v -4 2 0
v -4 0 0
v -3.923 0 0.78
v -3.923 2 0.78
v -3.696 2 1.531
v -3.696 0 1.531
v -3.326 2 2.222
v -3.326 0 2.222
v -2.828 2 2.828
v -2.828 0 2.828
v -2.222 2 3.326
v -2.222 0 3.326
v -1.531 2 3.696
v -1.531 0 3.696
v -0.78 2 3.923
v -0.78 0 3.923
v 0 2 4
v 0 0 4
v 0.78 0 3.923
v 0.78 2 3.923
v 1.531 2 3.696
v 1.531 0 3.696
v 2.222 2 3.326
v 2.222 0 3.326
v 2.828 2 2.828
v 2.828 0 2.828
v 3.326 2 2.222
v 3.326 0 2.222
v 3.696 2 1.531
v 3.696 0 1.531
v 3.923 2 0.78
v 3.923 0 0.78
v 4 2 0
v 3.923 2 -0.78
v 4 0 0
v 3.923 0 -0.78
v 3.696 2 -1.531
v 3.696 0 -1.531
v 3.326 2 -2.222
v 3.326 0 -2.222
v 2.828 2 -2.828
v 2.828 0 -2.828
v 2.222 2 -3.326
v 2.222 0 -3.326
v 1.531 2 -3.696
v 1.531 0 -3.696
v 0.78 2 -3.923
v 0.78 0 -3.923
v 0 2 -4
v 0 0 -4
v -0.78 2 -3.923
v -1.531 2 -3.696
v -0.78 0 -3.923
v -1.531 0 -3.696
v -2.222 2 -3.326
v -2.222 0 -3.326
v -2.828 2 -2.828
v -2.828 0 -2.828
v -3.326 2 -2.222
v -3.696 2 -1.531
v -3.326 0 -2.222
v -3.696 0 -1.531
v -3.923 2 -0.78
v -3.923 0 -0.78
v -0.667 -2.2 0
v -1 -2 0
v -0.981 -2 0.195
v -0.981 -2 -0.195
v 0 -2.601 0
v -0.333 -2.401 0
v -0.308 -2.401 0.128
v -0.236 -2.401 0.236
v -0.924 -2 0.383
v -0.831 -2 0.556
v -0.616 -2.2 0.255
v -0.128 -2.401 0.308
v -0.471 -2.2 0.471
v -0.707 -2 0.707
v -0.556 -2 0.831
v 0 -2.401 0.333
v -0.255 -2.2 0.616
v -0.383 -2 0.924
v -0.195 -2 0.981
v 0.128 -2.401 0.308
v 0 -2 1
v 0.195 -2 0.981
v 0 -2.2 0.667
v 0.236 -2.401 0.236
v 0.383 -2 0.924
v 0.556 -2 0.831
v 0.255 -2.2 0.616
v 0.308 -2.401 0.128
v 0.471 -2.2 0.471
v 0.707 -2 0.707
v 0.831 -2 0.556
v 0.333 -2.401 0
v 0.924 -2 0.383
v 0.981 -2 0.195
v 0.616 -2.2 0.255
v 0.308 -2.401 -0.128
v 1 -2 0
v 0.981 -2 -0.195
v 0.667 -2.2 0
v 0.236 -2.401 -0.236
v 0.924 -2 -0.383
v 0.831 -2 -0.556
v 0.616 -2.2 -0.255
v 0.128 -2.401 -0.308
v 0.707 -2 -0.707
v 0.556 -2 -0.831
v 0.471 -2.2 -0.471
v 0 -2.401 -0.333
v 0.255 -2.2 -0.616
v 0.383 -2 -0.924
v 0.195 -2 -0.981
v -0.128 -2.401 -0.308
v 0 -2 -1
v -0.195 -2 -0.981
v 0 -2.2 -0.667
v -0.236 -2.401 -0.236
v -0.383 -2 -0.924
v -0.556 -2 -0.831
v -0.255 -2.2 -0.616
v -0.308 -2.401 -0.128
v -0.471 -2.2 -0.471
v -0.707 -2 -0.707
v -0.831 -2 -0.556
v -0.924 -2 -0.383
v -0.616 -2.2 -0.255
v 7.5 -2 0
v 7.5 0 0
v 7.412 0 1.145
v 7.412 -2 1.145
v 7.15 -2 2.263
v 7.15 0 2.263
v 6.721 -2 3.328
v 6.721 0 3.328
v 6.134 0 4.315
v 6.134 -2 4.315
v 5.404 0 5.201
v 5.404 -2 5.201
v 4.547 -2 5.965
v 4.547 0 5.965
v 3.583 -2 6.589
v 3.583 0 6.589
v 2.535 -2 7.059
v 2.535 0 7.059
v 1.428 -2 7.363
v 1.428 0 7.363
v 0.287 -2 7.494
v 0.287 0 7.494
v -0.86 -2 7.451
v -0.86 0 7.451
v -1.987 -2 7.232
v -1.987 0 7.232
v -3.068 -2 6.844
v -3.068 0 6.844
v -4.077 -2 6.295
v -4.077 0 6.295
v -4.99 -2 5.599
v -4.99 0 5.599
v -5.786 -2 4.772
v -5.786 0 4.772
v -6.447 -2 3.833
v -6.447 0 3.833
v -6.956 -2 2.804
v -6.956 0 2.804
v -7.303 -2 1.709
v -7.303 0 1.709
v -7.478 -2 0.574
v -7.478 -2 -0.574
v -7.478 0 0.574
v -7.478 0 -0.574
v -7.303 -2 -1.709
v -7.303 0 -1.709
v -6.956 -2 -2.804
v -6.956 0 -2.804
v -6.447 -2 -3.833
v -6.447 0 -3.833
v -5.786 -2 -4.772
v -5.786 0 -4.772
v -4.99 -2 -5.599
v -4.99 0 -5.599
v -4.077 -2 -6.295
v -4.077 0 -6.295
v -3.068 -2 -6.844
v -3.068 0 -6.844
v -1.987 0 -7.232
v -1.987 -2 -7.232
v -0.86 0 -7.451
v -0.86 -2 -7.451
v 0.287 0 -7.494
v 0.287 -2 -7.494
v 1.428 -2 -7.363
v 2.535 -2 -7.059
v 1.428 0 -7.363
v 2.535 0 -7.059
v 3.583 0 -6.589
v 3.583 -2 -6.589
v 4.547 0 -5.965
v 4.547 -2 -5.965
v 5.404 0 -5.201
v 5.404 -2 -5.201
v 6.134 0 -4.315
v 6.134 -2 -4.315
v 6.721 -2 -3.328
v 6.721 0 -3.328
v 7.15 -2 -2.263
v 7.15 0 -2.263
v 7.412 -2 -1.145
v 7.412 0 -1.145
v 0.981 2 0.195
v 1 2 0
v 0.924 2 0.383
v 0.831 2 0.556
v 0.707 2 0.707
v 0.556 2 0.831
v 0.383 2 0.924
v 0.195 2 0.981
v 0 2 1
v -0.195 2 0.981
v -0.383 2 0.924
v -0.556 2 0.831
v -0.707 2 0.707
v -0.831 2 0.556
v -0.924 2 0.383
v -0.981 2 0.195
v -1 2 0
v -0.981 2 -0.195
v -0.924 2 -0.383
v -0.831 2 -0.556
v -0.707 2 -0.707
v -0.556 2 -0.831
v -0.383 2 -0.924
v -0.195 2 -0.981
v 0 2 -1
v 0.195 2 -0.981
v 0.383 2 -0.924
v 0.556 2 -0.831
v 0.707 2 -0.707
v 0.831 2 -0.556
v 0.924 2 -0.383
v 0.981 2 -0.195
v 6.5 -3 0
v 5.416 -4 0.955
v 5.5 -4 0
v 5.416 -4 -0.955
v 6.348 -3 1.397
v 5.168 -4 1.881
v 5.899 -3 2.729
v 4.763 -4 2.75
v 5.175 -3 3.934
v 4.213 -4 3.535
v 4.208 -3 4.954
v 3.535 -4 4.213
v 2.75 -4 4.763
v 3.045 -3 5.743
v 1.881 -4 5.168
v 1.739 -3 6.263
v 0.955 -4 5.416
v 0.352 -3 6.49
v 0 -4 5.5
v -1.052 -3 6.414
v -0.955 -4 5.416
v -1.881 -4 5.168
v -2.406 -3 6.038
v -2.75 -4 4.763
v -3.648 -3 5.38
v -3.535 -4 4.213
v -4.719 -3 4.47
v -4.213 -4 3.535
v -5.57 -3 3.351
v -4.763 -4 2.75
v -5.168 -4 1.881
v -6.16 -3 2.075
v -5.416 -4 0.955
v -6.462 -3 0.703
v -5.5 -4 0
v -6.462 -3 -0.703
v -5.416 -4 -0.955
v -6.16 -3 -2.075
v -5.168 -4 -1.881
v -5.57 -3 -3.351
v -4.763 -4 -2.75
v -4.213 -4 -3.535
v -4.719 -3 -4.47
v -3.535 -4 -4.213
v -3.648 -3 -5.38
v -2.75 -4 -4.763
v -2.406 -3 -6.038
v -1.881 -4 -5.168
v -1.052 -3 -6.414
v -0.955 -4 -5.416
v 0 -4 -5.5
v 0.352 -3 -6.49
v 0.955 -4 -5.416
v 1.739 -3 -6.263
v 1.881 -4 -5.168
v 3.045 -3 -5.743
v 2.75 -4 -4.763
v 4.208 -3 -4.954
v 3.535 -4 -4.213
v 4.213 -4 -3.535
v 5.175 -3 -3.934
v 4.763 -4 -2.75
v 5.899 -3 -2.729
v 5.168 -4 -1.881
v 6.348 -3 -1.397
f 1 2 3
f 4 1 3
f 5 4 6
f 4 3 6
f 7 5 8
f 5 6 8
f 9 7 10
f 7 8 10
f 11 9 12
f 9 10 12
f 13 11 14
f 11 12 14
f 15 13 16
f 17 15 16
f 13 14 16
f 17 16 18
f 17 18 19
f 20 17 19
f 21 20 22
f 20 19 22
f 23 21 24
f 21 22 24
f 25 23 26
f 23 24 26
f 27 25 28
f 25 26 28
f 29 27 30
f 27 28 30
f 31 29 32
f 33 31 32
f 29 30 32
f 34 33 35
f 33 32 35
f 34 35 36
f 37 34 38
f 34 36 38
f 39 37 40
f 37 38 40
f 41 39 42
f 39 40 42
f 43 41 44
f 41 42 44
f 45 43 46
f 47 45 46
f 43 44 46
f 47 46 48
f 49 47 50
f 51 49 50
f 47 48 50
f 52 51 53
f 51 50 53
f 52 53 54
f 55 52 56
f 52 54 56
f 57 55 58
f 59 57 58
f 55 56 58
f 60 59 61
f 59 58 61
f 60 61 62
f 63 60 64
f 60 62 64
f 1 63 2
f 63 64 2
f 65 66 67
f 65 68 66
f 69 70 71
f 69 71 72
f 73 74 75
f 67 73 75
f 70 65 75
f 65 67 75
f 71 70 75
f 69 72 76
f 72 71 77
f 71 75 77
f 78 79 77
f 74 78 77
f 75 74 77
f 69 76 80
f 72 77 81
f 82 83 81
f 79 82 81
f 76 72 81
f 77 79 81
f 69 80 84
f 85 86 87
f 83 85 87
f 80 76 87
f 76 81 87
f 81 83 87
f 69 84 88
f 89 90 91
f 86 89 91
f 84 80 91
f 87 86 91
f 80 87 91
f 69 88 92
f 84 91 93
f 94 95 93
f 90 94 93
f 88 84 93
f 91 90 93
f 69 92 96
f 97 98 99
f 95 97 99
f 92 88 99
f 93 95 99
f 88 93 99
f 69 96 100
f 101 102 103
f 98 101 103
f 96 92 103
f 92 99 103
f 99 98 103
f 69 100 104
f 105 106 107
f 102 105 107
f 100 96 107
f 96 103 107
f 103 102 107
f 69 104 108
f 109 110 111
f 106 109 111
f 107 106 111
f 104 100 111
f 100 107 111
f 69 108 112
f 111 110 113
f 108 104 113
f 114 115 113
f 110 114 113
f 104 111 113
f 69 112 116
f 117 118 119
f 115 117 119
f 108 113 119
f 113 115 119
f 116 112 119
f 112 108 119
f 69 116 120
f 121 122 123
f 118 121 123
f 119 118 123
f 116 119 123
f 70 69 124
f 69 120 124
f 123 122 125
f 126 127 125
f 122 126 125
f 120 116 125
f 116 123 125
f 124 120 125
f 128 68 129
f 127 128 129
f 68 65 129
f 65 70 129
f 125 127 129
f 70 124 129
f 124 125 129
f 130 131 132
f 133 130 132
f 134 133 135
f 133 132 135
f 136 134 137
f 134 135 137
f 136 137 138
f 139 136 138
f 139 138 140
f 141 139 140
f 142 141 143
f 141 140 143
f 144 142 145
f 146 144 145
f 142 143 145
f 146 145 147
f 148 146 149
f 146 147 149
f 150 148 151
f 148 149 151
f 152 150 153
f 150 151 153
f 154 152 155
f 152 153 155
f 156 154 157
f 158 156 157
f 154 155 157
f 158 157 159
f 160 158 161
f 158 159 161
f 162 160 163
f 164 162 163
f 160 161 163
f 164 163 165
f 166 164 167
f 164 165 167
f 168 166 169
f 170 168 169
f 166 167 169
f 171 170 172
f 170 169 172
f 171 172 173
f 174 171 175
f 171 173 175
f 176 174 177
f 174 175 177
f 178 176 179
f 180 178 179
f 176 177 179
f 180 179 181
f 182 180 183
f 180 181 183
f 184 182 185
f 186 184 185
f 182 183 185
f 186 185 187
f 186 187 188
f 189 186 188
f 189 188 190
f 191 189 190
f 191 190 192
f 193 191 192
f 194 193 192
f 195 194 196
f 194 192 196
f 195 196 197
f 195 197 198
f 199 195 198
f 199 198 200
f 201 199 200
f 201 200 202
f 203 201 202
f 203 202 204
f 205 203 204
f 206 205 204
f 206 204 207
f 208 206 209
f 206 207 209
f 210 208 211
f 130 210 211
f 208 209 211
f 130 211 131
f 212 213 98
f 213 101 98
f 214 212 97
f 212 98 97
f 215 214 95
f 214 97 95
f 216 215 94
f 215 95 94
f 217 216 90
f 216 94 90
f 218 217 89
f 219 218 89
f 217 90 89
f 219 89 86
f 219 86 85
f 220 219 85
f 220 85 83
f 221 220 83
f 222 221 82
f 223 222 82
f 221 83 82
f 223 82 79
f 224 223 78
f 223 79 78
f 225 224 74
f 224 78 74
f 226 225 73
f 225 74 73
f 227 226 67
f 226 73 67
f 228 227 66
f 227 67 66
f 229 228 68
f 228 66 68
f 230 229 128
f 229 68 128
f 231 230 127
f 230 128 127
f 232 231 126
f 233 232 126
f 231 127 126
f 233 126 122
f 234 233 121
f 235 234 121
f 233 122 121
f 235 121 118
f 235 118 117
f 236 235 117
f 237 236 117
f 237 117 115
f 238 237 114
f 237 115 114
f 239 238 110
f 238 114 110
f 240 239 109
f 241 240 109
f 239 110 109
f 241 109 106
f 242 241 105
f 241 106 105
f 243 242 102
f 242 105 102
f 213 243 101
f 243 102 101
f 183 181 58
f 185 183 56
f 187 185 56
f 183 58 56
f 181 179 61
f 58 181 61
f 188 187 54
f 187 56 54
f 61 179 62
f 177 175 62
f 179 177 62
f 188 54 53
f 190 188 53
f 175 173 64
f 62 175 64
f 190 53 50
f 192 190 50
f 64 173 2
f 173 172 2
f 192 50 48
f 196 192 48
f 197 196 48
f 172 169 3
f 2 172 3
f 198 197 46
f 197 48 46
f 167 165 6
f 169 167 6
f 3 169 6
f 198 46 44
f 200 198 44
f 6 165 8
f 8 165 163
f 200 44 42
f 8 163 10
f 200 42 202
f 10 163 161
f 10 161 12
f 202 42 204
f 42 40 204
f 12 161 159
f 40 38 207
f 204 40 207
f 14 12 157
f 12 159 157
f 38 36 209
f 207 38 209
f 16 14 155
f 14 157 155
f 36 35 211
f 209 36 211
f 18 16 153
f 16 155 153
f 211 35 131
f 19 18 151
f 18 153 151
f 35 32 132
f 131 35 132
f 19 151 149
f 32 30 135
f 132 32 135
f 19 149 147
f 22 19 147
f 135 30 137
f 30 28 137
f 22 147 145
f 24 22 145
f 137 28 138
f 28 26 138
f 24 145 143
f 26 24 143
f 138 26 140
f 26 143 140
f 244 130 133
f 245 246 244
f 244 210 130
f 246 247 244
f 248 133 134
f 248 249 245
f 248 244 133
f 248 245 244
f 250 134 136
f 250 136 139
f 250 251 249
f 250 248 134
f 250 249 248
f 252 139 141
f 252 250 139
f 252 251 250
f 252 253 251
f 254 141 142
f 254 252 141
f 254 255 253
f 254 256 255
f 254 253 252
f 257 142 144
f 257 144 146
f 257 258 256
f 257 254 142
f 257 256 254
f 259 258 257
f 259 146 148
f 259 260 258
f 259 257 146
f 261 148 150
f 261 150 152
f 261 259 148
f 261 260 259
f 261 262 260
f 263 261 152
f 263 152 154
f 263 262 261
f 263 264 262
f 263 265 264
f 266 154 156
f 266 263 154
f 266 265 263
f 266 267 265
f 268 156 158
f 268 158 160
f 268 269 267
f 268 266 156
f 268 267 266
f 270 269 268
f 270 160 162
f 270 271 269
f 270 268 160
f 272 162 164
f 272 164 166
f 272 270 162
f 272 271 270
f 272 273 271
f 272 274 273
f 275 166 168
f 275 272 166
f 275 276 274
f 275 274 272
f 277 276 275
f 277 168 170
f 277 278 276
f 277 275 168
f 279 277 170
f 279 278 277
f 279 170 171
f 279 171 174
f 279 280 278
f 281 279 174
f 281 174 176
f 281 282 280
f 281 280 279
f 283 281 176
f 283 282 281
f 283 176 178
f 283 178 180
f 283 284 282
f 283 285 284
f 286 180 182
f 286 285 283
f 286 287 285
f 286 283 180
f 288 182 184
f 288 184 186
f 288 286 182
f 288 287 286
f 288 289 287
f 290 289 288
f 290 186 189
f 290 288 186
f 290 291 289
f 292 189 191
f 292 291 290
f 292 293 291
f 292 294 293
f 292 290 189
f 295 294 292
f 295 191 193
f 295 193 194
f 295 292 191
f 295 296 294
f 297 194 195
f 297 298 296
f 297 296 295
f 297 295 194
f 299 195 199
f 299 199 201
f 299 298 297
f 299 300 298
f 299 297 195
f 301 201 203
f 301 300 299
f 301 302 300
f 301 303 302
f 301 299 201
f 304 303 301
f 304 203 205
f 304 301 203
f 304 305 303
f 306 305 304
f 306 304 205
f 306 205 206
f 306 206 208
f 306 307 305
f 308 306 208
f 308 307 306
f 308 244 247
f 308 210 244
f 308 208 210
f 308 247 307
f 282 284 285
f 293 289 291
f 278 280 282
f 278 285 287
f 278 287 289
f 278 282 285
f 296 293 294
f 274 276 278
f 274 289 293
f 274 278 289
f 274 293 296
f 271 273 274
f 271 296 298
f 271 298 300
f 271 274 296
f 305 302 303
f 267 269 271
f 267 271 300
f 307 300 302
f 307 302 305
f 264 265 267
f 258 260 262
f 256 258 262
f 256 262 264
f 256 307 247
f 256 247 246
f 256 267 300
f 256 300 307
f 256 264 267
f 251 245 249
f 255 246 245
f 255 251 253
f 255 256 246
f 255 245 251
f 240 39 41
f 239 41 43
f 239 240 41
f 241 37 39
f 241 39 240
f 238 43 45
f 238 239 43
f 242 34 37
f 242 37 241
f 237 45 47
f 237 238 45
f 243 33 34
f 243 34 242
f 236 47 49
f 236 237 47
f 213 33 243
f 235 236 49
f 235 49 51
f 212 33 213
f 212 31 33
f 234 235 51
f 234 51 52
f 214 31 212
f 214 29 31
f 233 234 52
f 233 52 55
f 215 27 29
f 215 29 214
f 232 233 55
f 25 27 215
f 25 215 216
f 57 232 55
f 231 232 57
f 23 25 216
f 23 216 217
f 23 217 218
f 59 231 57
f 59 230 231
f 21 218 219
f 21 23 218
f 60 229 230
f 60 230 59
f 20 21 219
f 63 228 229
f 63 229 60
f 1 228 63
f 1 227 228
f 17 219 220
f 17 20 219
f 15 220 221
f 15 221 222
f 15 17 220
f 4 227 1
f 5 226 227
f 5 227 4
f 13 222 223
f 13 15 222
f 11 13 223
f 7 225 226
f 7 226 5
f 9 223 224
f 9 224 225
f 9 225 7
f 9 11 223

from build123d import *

# Parameters (mm, degrees)
F0_R     = 7.5
F1_DEPTH = 4
F2_R     = 4
F3_DEPTH = 2
F5_D     = 2
F5_DEPTH = 4
F5_TIP   = 0.600860619
F6_SIZE  = 2


with BuildPart() as f1:
    # F0 (on Front) → F1 (new body)
    with BuildSketch(Plane.XZ):
        Circle(F0_R)
    extrude(amount=F1_DEPTH)

    # F2 (on face) → F3 (join)
    with BuildSketch(Plane(origin=(0, 0, 0), x_dir=(-1, 0, 0), z_dir=(0, 1, 0))):
        Circle(F2_R)
    extrude(amount=F3_DEPTH)

    # F5
    with Locations(Plane(origin=(0, 2, 0), x_dir=(-1, 0, 0), z_dir=(0, 1, 0))):
        with Locations((0, 0)):
            Hole(F5_D / 2, depth=F5_DEPTH)
            with Locations((0, 0, -(F5_DEPTH + F5_TIP / 2))):  # 118° drill point
                Cone(0, F5_D / 2, F5_TIP, mode=Mode.SUBTRACT)

    # F6
    f6_edges = [f1.edges().sort_by_distance(p)[0] for p in [
        (-7.5, -4, 0),
    ]]
    chamfer(f6_edges, length=F6_SIZE)


solid = f1.part
